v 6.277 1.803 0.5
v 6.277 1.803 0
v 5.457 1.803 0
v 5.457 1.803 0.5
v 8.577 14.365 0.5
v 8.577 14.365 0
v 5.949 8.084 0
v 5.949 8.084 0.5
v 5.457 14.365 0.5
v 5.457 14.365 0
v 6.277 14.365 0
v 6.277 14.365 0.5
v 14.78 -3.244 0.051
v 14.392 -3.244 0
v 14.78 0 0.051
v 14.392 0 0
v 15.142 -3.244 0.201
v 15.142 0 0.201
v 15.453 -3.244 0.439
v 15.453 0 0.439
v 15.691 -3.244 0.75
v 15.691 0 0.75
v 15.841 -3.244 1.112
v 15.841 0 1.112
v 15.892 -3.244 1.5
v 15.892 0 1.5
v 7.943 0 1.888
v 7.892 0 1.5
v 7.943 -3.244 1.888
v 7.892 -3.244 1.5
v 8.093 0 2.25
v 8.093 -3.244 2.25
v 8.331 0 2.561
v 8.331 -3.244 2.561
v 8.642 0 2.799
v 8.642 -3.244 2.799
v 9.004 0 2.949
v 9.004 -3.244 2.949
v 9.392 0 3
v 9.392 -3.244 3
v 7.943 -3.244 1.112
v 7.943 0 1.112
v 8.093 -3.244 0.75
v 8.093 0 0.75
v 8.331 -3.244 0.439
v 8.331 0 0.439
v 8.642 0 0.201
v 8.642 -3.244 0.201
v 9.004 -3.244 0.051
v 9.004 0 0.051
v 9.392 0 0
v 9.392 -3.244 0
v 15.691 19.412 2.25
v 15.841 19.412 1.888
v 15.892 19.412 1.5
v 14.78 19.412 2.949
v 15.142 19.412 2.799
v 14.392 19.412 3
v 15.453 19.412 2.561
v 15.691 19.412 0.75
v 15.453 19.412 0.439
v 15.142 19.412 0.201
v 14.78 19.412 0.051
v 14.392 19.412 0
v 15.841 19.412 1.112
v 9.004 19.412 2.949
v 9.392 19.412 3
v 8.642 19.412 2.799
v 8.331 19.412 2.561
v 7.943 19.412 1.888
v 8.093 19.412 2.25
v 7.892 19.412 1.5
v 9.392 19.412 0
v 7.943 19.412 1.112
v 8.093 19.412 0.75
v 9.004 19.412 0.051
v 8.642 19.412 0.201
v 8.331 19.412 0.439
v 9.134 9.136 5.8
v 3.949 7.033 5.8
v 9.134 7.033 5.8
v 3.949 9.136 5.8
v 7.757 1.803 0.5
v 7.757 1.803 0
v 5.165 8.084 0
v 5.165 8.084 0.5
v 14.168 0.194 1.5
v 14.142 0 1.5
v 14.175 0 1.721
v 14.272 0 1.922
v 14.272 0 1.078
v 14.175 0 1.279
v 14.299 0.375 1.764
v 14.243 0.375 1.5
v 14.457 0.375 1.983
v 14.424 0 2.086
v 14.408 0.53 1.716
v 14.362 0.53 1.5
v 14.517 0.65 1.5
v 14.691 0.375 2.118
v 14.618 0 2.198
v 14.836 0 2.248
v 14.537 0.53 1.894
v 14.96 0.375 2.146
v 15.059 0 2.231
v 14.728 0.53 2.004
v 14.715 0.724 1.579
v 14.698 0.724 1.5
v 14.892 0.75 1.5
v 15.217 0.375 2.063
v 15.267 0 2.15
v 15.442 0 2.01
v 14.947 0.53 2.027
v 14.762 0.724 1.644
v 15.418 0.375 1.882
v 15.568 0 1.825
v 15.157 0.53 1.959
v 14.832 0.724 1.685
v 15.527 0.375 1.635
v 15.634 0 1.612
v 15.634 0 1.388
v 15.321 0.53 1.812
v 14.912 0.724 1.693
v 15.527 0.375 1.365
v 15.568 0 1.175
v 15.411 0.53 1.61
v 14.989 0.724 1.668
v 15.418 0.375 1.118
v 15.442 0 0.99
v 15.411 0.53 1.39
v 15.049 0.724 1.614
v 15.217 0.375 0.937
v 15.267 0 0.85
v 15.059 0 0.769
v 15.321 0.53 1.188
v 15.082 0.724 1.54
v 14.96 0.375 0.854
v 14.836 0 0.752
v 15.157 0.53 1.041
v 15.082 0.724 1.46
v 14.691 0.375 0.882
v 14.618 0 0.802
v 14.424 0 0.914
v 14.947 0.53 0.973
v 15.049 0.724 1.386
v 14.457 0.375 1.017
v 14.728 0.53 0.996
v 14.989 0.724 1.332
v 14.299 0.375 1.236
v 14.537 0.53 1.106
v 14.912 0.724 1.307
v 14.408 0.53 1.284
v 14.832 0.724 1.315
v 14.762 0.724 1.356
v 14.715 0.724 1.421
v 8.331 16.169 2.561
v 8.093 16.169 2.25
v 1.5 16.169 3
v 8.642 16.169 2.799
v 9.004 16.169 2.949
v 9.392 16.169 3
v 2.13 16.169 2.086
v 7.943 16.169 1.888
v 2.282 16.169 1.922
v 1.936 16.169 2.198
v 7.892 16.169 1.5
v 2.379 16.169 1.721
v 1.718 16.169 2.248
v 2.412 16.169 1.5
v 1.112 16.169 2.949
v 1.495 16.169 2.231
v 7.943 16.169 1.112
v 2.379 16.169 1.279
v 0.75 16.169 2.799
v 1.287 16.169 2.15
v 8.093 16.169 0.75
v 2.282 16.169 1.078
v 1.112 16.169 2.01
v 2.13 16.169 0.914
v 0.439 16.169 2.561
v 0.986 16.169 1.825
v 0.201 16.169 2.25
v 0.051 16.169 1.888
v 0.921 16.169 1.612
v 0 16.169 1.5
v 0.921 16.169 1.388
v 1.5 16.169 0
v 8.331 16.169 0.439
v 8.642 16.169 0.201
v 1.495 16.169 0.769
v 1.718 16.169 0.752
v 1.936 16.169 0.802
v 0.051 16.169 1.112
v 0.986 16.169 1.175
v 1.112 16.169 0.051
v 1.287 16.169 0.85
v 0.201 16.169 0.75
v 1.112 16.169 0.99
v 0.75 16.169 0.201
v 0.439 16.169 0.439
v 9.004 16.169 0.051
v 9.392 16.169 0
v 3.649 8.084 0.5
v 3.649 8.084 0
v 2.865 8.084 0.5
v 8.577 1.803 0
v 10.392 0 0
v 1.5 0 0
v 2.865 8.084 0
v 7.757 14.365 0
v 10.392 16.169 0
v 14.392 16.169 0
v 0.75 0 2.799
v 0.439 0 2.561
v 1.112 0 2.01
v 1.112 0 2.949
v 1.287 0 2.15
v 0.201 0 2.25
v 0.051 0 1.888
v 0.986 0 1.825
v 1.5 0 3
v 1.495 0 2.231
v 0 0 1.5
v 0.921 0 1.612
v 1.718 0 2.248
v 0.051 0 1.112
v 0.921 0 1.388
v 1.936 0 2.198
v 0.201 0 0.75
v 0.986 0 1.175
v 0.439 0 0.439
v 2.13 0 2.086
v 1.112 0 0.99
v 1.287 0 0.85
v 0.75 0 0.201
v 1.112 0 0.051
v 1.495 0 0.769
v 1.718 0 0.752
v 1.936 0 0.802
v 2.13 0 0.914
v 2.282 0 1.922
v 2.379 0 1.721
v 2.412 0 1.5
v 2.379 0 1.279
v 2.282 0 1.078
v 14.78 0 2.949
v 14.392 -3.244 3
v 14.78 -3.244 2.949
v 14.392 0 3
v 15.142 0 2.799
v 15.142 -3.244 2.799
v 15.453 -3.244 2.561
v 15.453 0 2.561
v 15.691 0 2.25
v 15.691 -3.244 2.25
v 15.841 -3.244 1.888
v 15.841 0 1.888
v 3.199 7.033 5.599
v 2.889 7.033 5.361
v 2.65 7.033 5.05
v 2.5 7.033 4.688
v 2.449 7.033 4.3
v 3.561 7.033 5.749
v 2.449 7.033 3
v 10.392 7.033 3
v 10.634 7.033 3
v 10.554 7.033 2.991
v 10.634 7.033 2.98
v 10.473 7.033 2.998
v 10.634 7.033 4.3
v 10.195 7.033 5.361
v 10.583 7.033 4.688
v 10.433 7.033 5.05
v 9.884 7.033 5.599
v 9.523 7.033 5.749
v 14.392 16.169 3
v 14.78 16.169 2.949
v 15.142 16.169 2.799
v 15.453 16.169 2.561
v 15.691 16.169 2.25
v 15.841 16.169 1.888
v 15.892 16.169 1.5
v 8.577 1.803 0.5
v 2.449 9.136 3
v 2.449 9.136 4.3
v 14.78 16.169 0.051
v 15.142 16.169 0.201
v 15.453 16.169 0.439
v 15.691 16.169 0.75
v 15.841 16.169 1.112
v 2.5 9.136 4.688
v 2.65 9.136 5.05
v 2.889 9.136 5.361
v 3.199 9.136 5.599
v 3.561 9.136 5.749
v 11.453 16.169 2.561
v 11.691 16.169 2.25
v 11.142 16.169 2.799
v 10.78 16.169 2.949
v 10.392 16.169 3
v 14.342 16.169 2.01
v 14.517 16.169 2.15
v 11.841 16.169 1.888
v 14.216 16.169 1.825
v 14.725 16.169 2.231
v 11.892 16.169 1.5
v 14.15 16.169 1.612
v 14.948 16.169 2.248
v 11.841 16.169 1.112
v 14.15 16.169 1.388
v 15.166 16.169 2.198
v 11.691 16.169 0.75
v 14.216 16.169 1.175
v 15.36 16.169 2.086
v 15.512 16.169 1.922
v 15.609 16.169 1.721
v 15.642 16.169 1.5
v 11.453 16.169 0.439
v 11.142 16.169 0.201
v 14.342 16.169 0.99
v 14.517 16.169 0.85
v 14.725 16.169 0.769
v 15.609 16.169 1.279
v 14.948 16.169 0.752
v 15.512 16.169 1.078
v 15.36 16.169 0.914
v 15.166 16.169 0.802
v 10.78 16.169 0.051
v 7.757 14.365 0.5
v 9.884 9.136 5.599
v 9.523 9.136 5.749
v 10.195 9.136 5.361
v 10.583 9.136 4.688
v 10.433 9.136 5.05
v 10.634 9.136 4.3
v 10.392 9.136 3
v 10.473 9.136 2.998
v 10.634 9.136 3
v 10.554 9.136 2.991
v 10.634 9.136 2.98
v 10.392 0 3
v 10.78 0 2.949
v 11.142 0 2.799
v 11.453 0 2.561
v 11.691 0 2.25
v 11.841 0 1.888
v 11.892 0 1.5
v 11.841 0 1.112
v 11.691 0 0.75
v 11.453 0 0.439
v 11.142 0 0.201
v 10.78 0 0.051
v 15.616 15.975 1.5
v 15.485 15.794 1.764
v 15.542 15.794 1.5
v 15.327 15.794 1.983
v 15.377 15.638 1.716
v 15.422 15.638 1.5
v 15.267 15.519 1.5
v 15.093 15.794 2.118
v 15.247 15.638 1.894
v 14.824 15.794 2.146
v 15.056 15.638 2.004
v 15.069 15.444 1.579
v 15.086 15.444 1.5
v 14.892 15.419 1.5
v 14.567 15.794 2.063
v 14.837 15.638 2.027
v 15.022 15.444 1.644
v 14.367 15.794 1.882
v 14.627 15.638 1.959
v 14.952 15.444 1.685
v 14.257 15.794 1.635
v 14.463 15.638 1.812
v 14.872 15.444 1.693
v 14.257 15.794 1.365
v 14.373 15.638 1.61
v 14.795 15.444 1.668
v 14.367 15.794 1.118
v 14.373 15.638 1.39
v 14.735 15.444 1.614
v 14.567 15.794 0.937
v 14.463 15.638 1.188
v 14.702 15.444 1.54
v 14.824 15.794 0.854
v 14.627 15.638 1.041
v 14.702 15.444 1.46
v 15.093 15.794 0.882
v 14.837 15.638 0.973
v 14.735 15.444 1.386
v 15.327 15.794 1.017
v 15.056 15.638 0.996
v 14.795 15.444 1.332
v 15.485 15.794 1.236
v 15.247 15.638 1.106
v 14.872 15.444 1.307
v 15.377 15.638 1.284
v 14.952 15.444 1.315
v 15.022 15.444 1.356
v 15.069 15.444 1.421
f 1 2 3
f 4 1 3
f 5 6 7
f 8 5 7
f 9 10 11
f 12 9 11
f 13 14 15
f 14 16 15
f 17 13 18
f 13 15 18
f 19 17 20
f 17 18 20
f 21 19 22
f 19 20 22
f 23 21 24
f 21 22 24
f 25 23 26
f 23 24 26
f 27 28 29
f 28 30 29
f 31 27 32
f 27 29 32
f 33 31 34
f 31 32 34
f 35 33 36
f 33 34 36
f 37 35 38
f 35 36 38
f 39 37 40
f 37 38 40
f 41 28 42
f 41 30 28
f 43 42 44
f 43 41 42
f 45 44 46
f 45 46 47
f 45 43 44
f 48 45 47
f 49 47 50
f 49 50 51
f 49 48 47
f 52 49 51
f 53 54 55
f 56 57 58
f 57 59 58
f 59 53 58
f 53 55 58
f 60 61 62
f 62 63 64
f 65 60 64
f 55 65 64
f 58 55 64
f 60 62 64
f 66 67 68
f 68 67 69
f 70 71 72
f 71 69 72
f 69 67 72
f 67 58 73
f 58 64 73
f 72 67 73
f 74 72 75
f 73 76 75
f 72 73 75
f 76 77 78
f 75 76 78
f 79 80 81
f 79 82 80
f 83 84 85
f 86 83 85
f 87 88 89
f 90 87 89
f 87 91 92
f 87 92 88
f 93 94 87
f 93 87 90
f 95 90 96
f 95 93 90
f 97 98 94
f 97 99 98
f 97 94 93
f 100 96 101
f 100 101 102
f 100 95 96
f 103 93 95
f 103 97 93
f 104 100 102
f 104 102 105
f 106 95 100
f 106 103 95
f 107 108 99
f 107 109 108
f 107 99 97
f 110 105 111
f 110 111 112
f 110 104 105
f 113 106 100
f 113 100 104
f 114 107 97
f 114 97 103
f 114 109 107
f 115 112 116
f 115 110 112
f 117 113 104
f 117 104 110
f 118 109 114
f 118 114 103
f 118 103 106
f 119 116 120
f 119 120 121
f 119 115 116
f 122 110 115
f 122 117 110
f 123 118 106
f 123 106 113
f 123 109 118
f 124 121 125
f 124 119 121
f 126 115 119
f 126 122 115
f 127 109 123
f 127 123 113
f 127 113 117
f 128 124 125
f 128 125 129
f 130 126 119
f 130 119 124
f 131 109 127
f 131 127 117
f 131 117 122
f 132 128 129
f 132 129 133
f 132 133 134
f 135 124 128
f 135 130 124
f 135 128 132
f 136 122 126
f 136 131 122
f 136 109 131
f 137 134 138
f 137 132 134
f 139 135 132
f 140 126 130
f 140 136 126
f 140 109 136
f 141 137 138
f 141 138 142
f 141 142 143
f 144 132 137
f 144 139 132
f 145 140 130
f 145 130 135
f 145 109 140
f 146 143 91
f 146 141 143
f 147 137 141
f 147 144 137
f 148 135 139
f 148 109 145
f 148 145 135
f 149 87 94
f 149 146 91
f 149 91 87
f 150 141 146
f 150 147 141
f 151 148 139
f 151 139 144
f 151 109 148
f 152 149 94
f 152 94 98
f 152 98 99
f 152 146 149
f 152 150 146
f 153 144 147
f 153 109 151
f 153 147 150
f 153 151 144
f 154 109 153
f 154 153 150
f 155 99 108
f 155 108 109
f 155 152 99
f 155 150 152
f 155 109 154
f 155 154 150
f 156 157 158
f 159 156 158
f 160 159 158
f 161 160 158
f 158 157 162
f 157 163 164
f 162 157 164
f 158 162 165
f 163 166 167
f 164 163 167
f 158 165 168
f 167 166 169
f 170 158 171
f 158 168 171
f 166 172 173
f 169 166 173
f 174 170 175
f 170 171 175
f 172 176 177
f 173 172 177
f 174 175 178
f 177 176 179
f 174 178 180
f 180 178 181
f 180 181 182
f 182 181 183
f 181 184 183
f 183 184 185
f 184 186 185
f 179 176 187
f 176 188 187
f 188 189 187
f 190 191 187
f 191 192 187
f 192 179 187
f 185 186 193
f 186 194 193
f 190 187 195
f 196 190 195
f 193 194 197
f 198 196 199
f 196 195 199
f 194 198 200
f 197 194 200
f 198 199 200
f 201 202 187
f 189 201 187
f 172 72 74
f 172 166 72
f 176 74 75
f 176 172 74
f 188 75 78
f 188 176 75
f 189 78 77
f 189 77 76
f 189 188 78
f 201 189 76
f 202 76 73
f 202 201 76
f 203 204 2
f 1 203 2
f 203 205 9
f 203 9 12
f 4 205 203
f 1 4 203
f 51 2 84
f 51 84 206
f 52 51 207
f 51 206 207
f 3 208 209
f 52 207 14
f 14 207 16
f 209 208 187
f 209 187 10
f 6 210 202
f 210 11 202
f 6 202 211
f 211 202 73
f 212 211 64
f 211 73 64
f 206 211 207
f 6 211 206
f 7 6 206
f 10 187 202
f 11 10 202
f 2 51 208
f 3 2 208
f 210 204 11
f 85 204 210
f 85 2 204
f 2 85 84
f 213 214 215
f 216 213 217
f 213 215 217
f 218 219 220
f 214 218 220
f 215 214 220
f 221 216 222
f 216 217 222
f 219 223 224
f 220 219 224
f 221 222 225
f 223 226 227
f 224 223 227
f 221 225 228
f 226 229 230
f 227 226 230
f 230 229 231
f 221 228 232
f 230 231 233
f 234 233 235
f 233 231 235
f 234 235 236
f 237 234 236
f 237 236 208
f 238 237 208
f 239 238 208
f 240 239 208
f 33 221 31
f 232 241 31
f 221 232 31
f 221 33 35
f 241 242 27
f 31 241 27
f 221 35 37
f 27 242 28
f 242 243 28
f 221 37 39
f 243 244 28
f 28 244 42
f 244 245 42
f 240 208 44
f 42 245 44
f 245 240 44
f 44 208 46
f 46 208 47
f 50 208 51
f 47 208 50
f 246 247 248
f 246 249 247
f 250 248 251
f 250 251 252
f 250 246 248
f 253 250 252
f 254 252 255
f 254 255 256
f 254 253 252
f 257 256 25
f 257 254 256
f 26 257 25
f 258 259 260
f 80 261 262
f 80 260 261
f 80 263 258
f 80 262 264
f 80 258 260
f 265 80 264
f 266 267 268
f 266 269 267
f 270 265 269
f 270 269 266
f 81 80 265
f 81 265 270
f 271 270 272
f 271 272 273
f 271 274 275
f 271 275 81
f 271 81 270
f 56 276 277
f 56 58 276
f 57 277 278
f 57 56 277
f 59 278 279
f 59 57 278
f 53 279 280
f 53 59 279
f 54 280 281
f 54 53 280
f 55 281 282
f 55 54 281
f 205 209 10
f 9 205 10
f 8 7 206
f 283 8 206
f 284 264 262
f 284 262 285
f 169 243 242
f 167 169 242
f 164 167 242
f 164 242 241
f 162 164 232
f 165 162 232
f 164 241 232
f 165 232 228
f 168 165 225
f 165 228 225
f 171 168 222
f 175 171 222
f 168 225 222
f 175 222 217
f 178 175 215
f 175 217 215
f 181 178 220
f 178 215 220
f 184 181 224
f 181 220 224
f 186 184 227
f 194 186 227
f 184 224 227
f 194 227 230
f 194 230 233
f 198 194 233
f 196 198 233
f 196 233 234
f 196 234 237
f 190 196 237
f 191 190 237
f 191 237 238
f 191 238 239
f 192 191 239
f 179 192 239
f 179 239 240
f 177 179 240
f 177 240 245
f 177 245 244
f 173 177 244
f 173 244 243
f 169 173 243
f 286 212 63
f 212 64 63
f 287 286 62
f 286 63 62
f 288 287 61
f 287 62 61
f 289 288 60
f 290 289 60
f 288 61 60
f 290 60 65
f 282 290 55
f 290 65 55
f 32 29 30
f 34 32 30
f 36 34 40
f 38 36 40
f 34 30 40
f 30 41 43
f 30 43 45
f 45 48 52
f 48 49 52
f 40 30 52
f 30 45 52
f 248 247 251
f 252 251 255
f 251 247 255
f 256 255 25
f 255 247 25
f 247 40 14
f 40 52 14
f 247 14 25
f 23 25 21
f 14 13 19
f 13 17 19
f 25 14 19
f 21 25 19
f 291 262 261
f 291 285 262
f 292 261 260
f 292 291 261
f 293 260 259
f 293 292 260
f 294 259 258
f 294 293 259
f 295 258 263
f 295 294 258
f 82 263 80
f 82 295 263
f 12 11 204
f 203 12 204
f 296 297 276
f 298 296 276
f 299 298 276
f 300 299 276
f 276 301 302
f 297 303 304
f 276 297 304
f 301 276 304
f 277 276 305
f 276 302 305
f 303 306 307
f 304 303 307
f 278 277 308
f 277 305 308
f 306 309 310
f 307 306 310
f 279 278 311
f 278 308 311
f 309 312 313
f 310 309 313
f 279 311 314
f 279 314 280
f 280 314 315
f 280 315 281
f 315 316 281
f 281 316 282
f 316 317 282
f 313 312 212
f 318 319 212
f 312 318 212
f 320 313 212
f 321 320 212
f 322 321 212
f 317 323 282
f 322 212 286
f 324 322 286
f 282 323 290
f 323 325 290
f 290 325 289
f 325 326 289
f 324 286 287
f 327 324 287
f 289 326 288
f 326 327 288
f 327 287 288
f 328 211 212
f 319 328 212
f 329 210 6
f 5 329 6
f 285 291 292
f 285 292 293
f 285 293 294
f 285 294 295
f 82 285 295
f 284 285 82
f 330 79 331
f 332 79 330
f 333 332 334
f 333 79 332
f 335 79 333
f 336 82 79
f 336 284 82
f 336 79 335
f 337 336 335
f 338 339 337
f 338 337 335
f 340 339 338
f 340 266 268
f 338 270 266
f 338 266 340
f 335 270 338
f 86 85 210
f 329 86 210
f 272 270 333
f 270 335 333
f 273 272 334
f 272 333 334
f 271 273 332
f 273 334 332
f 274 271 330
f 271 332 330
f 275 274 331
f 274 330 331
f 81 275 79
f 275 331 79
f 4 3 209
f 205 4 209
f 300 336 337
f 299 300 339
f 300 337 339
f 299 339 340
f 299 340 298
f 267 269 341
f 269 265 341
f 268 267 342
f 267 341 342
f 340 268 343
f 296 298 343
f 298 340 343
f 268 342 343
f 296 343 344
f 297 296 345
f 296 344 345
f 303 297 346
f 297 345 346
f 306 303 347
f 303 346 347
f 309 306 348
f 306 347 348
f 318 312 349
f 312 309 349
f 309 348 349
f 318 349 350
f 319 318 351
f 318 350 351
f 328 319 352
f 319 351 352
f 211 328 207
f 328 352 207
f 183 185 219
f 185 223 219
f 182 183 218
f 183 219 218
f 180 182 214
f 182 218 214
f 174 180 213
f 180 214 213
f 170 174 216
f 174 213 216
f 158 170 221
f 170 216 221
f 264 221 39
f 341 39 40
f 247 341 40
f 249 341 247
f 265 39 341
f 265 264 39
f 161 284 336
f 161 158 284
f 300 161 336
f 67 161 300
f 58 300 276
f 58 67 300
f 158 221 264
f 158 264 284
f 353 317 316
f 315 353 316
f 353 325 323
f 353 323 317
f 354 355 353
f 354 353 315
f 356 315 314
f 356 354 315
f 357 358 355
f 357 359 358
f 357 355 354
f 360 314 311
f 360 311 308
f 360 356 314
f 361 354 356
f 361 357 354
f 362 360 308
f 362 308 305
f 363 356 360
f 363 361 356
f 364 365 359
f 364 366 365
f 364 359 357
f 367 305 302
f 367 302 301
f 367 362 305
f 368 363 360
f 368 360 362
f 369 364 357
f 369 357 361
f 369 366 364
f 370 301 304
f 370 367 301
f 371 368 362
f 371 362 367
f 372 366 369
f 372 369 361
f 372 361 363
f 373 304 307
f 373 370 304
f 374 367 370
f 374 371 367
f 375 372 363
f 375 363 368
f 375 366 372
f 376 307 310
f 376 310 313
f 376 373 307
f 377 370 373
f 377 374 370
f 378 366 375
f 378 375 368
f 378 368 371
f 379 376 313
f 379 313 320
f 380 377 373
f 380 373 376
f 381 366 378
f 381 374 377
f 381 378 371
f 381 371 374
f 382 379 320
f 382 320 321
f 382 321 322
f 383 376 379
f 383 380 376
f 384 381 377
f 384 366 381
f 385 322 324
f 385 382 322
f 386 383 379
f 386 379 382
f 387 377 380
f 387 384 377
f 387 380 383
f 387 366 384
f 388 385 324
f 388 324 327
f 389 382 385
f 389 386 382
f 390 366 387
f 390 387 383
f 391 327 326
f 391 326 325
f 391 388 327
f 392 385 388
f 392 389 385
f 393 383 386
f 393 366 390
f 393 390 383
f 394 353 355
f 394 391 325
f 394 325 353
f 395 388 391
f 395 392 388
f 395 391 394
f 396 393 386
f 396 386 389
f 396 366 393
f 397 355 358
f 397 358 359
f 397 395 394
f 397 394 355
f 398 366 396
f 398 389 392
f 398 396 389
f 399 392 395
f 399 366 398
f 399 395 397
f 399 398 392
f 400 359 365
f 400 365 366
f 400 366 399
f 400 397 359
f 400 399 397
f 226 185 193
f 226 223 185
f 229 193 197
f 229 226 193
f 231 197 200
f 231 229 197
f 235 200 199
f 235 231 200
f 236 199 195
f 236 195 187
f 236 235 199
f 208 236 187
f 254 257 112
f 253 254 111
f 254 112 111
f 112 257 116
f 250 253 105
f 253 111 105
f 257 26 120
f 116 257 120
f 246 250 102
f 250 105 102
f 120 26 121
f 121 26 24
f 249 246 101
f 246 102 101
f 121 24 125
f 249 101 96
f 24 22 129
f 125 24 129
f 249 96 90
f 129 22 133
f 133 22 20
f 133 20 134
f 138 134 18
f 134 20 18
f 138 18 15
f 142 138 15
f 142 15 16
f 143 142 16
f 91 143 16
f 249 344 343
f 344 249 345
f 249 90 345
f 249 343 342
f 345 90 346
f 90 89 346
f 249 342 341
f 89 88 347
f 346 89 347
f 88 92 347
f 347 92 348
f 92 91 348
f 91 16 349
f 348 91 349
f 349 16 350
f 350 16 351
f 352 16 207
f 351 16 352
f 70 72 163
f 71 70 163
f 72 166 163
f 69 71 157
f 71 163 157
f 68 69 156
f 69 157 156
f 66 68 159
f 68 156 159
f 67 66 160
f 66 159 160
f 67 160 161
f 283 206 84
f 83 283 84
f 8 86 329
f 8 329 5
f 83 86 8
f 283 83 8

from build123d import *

# Parameters (mm, degrees)
F1_DEPTH      = 3
F2_R          = 0.75
F3_DEPTH      = 0.75
F4_R          = 0.75
F5_DEPTH      = 0.75
F6_R          = 0.75
F7_DEPTH      = 25
F8_R          = 1.49999
F9_W          = 8.1852182662
F9_H          = 2.1034856807
F10_DEPTH     = 2.8
F11_R         = 1.5
F13_DEPTH     = 0.5
F14_R         = 0.74999
F15_T1_DEPTH  = 16.1687540342
F15_T6_DEPTH  = 19.9187540342
F15_T11_DEPTH = 19.9187540342
F15_T17_DEPTH = 19.9187540342
F16_R         = 1.49999


# Not quite as in the source:
# - a fillet or chamfer that OpenCascade refuses, or shapes differently, is made with other operations: its cross-section is extruded or revolved along the edge and cut away or added
# - a fillet or chamfer is up to 0.001 mm smaller than in the source, because OpenCascade refuses the exact size
# - a feature names something its author has since deleted; it is built from what else it names


with BuildPart() as f1:
    # F0 (on Top) → F1 (new body)
    with BuildSketch(Plane.XY):
        Polygon((0, 16.1687540342), (0, 0), (7.8920411056, 0), (11.8920411056, 0), (11.8920411056, 16.1687540342), (7.8920411056, 16.1687540342), align=None)
        Polygon((7.8920411056, 19.412382182), (7.8920411056, 16.1687540342), (11.8920411056, 16.1687540342), (15.8920411056, 16.1687540342), (15.8920411056, 19.412382182), align=None)
        Polygon((11.8920411056, 0), (7.8920411056, 0), (7.8920411056, -3.2436281478), (15.8920411056, -3.2436281478), (15.8920411056, 0), align=None)
    extrude(amount=F1_DEPTH)

    # F2 (on face) → F3 (join)
    with BuildSketch(Plane.XZ.offset(-16.1687540342)):
        with Locations((14.8920411056, 1.5)):
            Circle(F2_R)
    extrude(amount=F3_DEPTH)

    # F4 (on face) → F5 (join)
    with BuildSketch(Plane(origin=(0, 0, 0), x_dir=(-1, 0, 0), z_dir=(0, 1, 0))):
        with Locations((-14.8920411056, 1.5)):
            Circle(F4_R)
    extrude(amount=F5_DEPTH)

    # F6 (on face) → F7 (cut)
    with BuildSketch(Plane.XZ):
        with Locations((1.6622071853, 1.5)):
            Circle(F6_R)
    extrude(amount=-F7_DEPTH, mode=Mode.SUBTRACT)

    # F8 (radius 1.5 in the source; OpenCascade refuses exactly that, so slightly less here)
    f8_edges = [f1.edges().sort_by_distance(p)[0] for p in [
        (0, 8.084377, 3),
        (0, 8.084377, 0),
        (15.892041, 17.790568, 3),
        (15.892041, 17.790568, 0),
        (15.892041, -1.621814, 3),
        (15.892041, -1.621814, 0),
    ]]
    fillet(f8_edges, radius=F8_R)

    # F9 (on face) → F10 (join)
    with BuildSketch(Plane.XY.offset(3)):
        with Locations((6.5418113065, 8.0843770171)):
            Rectangle(F9_W, F9_H)
    extrude(amount=F10_DEPTH)

    # F11
    f11_edges = [f1.edges().sort_by_distance(p)[0] for p in [
        (10.63442, 8.084377, 5.8),
        (2.449202, 8.084377, 5.8),
    ]]
    fillet(f11_edges, radius=F11_R)

    # F12 (on face) → F13 (cut)
    with BuildSketch(Plane(origin=(0, 0, 0), x_dir=(1, 0, 0), z_dir=(0, 0, -1))):
        Polygon((5.4570450447, -1.8034656052), (2.8651286848, -8.0843770171), (5.4570450447, -14.365288429), (6.276931148, -14.365288429), (3.6494208034, -8.0843770171), (6.276931148, -1.8034656052), align=None)
        Polygon((7.7570450447, -1.8034656052), (5.1651286848, -8.0843770171), (7.7570450447, -14.365288429), (8.576931148, -14.365288429), (5.9494208034, -8.0843770171), (8.576931148, -1.8034656052), align=None)
    extrude(amount=-F13_DEPTH, mode=Mode.SUBTRACT)

    # F14 (radius 0.75 in the source; OpenCascade refuses exactly that, so slightly less here)
    f14_edges = [f1.edges().sort_by_distance(p)[0] for p in [
        (15.642041, 0.75, 1.5),
        (14.142041, 15.418754, 1.5),
    ]]
    fillet(f14_edges, radius=F14_R)

    # F15: fillet of radius 1.5 on 2 edges, made by hand

    # F15_s2 → F15_t1 (cut)
    with BuildSketch(Plane.XZ.offset(-16.1687540342)):
        with BuildLine():
            ThreePointArc((10.3920411056, 0), (11.4527012774, 0.4393398282), (11.8920411056, 1.5))
            Line((11.8920411056, 1.5), (11.8920411056, 0))
            Line((11.8920411056, 0), (10.3920411056, 0))
        make_face()
    extrude(amount=F15_T1_DEPTH, mode=Mode.SUBTRACT)


with BuildPart() as f15_tool4:
    # F15_s5 → F15_t6 (new body)
    with BuildSketch(Plane.XZ):
        with BuildLine():
            ThreePointArc((10.3920411056, 3), (11.4527012774, 2.5606601718), (11.8920411056, 1.5))
            Line((11.8920411056, 1.5), (11.8920411056, 3))
            Line((11.8920411056, 3), (10.3920411056, 3))
        make_face()
    extrude(amount=-F15_T6_DEPTH)

    split(bisect_by=Plane.XZ.offset(-7.0326341767), keep=Keep.TOP)


with BuildPart() as f1_1:
    add(f1.part)

    # F15_t3: cut F15_tool4
    add(f15_tool4.part, mode=Mode.SUBTRACT)


with BuildPart() as f15_tool9:
    # F15_s10 → F15_t11 (new body)
    with BuildSketch(Plane.XZ.offset(3.75)):
        with BuildLine():
            ThreePointArc((10.3920411056, 3), (11.4527012774, 2.5606601718), (11.8920411056, 1.5))
            Line((11.8920411056, 1.5), (11.8920411056, 3))
            Line((11.8920411056, 3), (10.3920411056, 3))
        make_face()
    extrude(amount=-F15_T11_DEPTH)

    split(bisect_by=Plane.XZ.offset(-7.0326341767), keep=Keep.BOTTOM)

    split(bisect_by=Plane.YZ.offset(10.6344204396), keep=Keep.TOP)


with BuildPart() as f1_2:
    add(f1_1.part)

    # F15_t8: cut F15_tool9
    add(f15_tool9.part, mode=Mode.SUBTRACT)


with BuildPart() as f15_tool15:
    # F15_s16 → F15_t17 (new body)
    with BuildSketch(Plane.XZ.offset(3.75)):
        with BuildLine():
            ThreePointArc((10.3920411056, 3), (11.4527012774, 2.5606601718), (11.8920411056, 1.5))
            Line((11.8920411056, 1.5), (11.8920411056, 3))
            Line((11.8920411056, 3), (10.3920411056, 3))
        make_face()
    extrude(amount=-F15_T17_DEPTH)

    split(bisect_by=Plane.XZ.offset(-9.1361198574), keep=Keep.BOTTOM)


with BuildPart() as f1_3:
    add(f1_2.part)

    # F15_t14: cut F15_tool15
    add(f15_tool15.part, mode=Mode.SUBTRACT)

    # F16 (radius 1.5 in the source; OpenCascade refuses exactly that, so slightly less here)
    f16_edges = [f1_3.edges().sort_by_distance(p)[0] for p in [
        (7.892041, -1.621814, 3),
        (7.892041, -1.621814, 0),
        (7.892041, 17.790568, 3),
        (7.892041, 17.790568, 0),
    ]]
    fillet(f16_edges, radius=F16_R)


solid = f1_3.part
